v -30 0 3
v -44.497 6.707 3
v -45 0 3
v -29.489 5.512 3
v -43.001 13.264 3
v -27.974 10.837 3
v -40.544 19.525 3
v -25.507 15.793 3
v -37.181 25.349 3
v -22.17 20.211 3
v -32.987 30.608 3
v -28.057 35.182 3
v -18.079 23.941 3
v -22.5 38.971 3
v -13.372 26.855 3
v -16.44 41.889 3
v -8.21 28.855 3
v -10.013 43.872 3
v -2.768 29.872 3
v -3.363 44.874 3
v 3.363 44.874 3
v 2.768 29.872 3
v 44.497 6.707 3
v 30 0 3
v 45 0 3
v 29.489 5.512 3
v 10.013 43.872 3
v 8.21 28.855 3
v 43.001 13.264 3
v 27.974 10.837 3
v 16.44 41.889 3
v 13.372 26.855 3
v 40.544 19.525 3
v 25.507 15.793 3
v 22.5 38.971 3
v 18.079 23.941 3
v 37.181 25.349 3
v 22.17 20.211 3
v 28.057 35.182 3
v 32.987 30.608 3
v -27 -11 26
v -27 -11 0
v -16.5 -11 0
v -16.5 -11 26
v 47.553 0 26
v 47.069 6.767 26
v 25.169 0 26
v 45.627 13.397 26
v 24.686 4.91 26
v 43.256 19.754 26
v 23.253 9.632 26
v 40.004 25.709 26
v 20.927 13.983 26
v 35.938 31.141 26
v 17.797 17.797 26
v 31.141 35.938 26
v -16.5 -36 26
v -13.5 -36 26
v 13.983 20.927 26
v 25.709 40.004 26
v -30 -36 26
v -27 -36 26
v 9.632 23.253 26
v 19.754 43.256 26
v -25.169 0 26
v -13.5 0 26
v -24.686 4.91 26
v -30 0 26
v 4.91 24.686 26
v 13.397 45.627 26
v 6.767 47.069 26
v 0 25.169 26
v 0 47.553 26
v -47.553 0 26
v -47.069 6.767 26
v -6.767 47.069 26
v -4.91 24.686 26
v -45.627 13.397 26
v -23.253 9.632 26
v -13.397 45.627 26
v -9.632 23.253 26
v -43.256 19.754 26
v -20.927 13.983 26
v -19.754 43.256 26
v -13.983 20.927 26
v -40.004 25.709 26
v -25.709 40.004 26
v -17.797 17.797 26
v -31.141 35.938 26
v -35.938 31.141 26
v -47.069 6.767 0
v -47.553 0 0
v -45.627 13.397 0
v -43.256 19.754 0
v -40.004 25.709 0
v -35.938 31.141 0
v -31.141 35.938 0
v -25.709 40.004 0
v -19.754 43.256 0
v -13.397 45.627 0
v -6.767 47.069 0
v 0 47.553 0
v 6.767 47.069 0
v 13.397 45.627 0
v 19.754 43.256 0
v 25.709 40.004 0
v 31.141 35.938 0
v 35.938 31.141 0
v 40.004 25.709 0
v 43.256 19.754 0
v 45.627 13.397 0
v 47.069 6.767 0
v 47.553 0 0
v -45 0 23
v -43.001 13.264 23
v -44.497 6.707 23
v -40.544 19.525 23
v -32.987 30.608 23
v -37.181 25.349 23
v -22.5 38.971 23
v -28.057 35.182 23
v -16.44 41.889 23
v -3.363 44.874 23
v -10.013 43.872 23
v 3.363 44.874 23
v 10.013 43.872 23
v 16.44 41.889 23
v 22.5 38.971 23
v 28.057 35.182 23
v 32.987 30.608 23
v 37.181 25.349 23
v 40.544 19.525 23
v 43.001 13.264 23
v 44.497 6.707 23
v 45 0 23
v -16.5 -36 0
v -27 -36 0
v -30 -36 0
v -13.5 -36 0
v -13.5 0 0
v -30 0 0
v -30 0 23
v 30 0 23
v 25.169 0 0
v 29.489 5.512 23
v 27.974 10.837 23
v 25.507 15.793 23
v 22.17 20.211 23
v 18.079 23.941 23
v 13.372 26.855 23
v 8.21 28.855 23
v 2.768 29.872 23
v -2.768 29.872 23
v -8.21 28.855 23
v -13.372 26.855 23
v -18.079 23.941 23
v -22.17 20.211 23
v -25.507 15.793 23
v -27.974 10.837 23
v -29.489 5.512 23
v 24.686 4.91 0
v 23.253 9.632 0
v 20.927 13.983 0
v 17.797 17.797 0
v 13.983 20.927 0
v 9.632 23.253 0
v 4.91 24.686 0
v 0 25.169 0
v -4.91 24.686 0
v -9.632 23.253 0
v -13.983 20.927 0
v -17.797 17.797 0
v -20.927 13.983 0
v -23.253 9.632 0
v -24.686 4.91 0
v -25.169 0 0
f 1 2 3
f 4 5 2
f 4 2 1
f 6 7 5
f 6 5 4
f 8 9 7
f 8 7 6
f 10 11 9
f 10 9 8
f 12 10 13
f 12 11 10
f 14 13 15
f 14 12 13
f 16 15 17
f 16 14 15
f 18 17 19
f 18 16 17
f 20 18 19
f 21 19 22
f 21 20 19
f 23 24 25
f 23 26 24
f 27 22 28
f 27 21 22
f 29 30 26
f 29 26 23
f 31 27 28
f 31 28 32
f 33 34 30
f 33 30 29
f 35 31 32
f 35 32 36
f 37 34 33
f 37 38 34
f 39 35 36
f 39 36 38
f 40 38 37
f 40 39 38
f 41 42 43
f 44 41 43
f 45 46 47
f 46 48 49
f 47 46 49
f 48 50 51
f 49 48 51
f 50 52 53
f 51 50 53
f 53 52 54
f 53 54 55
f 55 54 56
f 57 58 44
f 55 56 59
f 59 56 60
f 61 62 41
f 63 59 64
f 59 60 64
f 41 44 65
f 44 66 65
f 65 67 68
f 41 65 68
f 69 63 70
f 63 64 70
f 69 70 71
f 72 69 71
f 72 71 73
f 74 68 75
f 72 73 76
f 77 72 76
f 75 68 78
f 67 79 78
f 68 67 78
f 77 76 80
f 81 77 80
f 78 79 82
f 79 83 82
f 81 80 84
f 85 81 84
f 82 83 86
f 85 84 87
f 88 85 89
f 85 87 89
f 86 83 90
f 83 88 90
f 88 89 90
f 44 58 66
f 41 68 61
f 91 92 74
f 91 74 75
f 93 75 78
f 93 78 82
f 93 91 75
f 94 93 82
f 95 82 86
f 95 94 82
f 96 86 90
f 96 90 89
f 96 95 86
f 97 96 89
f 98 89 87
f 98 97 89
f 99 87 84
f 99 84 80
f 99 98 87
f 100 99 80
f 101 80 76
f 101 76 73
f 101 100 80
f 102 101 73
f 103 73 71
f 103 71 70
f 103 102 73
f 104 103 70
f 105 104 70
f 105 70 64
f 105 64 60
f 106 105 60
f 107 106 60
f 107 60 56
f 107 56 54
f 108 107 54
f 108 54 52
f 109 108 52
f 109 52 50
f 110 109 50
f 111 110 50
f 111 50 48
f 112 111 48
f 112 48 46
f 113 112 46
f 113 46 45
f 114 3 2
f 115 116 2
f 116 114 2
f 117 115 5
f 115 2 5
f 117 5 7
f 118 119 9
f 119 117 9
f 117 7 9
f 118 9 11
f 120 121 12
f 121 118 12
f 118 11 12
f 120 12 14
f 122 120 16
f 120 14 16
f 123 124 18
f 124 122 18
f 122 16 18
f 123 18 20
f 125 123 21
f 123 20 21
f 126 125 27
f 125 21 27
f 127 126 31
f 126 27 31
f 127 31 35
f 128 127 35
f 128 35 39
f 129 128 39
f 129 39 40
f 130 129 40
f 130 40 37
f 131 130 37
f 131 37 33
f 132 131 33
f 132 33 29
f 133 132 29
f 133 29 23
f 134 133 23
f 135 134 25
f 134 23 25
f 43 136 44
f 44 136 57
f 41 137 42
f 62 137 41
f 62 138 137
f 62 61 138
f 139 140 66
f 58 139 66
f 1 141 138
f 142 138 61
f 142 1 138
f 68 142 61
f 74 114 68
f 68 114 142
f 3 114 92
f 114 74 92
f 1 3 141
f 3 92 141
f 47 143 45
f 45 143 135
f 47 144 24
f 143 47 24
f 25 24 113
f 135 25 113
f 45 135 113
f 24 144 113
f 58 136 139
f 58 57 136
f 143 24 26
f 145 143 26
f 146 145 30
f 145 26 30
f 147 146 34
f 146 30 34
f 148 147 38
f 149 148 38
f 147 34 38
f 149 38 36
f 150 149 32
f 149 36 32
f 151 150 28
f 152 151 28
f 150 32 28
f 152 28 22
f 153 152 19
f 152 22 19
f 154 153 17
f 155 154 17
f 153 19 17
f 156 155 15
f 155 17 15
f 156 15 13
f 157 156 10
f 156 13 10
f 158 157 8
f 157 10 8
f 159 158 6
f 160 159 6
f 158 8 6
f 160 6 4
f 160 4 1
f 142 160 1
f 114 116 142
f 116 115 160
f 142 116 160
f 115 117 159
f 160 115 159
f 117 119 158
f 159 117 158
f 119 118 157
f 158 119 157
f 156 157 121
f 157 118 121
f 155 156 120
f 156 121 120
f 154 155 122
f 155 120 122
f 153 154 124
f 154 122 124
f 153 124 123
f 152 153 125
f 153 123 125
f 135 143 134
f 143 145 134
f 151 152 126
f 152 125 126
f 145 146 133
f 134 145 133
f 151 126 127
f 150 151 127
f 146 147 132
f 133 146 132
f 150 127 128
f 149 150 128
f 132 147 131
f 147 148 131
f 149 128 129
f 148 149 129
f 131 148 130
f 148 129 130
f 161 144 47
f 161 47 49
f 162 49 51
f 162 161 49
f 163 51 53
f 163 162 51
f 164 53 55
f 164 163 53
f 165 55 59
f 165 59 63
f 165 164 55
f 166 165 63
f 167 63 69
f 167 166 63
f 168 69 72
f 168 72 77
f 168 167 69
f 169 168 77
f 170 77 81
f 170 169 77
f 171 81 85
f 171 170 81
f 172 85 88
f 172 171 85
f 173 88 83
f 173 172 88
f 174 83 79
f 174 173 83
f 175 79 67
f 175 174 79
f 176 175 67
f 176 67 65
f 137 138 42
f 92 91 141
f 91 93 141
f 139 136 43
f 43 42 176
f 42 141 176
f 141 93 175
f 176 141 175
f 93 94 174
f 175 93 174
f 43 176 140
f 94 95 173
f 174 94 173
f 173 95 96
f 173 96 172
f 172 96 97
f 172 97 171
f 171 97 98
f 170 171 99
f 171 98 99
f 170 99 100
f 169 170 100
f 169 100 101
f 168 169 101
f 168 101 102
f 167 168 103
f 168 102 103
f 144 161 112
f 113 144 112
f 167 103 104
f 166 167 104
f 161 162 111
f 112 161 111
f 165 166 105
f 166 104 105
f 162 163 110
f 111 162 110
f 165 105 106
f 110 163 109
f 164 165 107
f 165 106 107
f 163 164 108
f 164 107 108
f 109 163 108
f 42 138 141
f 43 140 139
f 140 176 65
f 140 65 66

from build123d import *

# Parameters (mm, degrees)
F0_R      = 30
F0_R_2    = 25.169146
F1_DEPTH  = 26
F0_R_3    = 45
F2_DEPTH  = 3
F3_R      = 45
F3_R_2    = 30
F4_DEPTH  = 3
F5_R      = 47.552923
F5_R_2    = 45
F6_DEPTH  = 26
F8_DEPTH  = 26
F9_W      = 10.5
F9_H      = 26
F9_W_2    = 3
F10_DEPTH = 36
F11_W     = 10.5
F11_H     = 26
F12_DEPTH = 25


with BuildPart() as f1:
    # F0 (on Top) → F1 (new body)
    with BuildSketch(Plane.XY):
        Circle(F0_R)
        Circle(F0_R_2, mode=Mode.SUBTRACT)
    extrude(amount=F1_DEPTH)

    # F0 (on Top) → F2 (join)
    with BuildSketch(Plane.XY):
        Circle(F0_R_3)
        Circle(F0_R, mode=Mode.SUBTRACT)
    extrude(amount=F2_DEPTH)

    # F3 (on face) → F4 (join)
    with BuildSketch(Plane.XY.offset(26)):
        Circle(F3_R)
        Circle(F3_R_2, mode=Mode.SUBTRACT)
    extrude(amount=-F4_DEPTH)

    # F5 (on face) → F6 (join)
    with BuildSketch(Plane(origin=(0, 0, 0), x_dir=(1, 0, 0), z_dir=(0, 0, -1))):
        Circle(F5_R)
        Circle(F5_R_2, mode=Mode.SUBTRACT)
    extrude(amount=-F6_DEPTH)

    # F7 (on face) → F8 (cut)
    with BuildSketch(Plane(origin=(0, 0, 0), x_dir=(1, 0, 0), z_dir=(0, 0, -1))):
        with BuildLine():
            Line((25.169146, 0), (47.552923, 0))
            ThreePointArc((47.552923, 0), (0, 47.552923), (-47.552923, 0))
            Line((-47.552923, 0), (-25.169146, 0))
            ThreePointArc((-25.169146, 0), (0, 25.169146), (25.169146, 0))
        make_face()
    extrude(amount=-F8_DEPTH, mode=Mode.SUBTRACT)

    # F9 (on face) → F10 (join)
    with BuildSketch(Plane.XZ):
        with Locations((-21.75, 13)):
            Rectangle(F9_W, F9_H)
        with Locations((-15, 13)):
            Rectangle(F9_W_2, F9_H)
        with Locations((-28.5, 13)):
            Rectangle(F9_W_2, F9_H)
    extrude(amount=F10_DEPTH)

    # F11 (on face) → F12 (cut)
    with BuildSketch(Plane.XZ.offset(36)):
        with Locations((-21.75, 13)):
            Rectangle(F11_W, F11_H)
    extrude(amount=-F12_DEPTH, mode=Mode.SUBTRACT)


solid = f1.part
